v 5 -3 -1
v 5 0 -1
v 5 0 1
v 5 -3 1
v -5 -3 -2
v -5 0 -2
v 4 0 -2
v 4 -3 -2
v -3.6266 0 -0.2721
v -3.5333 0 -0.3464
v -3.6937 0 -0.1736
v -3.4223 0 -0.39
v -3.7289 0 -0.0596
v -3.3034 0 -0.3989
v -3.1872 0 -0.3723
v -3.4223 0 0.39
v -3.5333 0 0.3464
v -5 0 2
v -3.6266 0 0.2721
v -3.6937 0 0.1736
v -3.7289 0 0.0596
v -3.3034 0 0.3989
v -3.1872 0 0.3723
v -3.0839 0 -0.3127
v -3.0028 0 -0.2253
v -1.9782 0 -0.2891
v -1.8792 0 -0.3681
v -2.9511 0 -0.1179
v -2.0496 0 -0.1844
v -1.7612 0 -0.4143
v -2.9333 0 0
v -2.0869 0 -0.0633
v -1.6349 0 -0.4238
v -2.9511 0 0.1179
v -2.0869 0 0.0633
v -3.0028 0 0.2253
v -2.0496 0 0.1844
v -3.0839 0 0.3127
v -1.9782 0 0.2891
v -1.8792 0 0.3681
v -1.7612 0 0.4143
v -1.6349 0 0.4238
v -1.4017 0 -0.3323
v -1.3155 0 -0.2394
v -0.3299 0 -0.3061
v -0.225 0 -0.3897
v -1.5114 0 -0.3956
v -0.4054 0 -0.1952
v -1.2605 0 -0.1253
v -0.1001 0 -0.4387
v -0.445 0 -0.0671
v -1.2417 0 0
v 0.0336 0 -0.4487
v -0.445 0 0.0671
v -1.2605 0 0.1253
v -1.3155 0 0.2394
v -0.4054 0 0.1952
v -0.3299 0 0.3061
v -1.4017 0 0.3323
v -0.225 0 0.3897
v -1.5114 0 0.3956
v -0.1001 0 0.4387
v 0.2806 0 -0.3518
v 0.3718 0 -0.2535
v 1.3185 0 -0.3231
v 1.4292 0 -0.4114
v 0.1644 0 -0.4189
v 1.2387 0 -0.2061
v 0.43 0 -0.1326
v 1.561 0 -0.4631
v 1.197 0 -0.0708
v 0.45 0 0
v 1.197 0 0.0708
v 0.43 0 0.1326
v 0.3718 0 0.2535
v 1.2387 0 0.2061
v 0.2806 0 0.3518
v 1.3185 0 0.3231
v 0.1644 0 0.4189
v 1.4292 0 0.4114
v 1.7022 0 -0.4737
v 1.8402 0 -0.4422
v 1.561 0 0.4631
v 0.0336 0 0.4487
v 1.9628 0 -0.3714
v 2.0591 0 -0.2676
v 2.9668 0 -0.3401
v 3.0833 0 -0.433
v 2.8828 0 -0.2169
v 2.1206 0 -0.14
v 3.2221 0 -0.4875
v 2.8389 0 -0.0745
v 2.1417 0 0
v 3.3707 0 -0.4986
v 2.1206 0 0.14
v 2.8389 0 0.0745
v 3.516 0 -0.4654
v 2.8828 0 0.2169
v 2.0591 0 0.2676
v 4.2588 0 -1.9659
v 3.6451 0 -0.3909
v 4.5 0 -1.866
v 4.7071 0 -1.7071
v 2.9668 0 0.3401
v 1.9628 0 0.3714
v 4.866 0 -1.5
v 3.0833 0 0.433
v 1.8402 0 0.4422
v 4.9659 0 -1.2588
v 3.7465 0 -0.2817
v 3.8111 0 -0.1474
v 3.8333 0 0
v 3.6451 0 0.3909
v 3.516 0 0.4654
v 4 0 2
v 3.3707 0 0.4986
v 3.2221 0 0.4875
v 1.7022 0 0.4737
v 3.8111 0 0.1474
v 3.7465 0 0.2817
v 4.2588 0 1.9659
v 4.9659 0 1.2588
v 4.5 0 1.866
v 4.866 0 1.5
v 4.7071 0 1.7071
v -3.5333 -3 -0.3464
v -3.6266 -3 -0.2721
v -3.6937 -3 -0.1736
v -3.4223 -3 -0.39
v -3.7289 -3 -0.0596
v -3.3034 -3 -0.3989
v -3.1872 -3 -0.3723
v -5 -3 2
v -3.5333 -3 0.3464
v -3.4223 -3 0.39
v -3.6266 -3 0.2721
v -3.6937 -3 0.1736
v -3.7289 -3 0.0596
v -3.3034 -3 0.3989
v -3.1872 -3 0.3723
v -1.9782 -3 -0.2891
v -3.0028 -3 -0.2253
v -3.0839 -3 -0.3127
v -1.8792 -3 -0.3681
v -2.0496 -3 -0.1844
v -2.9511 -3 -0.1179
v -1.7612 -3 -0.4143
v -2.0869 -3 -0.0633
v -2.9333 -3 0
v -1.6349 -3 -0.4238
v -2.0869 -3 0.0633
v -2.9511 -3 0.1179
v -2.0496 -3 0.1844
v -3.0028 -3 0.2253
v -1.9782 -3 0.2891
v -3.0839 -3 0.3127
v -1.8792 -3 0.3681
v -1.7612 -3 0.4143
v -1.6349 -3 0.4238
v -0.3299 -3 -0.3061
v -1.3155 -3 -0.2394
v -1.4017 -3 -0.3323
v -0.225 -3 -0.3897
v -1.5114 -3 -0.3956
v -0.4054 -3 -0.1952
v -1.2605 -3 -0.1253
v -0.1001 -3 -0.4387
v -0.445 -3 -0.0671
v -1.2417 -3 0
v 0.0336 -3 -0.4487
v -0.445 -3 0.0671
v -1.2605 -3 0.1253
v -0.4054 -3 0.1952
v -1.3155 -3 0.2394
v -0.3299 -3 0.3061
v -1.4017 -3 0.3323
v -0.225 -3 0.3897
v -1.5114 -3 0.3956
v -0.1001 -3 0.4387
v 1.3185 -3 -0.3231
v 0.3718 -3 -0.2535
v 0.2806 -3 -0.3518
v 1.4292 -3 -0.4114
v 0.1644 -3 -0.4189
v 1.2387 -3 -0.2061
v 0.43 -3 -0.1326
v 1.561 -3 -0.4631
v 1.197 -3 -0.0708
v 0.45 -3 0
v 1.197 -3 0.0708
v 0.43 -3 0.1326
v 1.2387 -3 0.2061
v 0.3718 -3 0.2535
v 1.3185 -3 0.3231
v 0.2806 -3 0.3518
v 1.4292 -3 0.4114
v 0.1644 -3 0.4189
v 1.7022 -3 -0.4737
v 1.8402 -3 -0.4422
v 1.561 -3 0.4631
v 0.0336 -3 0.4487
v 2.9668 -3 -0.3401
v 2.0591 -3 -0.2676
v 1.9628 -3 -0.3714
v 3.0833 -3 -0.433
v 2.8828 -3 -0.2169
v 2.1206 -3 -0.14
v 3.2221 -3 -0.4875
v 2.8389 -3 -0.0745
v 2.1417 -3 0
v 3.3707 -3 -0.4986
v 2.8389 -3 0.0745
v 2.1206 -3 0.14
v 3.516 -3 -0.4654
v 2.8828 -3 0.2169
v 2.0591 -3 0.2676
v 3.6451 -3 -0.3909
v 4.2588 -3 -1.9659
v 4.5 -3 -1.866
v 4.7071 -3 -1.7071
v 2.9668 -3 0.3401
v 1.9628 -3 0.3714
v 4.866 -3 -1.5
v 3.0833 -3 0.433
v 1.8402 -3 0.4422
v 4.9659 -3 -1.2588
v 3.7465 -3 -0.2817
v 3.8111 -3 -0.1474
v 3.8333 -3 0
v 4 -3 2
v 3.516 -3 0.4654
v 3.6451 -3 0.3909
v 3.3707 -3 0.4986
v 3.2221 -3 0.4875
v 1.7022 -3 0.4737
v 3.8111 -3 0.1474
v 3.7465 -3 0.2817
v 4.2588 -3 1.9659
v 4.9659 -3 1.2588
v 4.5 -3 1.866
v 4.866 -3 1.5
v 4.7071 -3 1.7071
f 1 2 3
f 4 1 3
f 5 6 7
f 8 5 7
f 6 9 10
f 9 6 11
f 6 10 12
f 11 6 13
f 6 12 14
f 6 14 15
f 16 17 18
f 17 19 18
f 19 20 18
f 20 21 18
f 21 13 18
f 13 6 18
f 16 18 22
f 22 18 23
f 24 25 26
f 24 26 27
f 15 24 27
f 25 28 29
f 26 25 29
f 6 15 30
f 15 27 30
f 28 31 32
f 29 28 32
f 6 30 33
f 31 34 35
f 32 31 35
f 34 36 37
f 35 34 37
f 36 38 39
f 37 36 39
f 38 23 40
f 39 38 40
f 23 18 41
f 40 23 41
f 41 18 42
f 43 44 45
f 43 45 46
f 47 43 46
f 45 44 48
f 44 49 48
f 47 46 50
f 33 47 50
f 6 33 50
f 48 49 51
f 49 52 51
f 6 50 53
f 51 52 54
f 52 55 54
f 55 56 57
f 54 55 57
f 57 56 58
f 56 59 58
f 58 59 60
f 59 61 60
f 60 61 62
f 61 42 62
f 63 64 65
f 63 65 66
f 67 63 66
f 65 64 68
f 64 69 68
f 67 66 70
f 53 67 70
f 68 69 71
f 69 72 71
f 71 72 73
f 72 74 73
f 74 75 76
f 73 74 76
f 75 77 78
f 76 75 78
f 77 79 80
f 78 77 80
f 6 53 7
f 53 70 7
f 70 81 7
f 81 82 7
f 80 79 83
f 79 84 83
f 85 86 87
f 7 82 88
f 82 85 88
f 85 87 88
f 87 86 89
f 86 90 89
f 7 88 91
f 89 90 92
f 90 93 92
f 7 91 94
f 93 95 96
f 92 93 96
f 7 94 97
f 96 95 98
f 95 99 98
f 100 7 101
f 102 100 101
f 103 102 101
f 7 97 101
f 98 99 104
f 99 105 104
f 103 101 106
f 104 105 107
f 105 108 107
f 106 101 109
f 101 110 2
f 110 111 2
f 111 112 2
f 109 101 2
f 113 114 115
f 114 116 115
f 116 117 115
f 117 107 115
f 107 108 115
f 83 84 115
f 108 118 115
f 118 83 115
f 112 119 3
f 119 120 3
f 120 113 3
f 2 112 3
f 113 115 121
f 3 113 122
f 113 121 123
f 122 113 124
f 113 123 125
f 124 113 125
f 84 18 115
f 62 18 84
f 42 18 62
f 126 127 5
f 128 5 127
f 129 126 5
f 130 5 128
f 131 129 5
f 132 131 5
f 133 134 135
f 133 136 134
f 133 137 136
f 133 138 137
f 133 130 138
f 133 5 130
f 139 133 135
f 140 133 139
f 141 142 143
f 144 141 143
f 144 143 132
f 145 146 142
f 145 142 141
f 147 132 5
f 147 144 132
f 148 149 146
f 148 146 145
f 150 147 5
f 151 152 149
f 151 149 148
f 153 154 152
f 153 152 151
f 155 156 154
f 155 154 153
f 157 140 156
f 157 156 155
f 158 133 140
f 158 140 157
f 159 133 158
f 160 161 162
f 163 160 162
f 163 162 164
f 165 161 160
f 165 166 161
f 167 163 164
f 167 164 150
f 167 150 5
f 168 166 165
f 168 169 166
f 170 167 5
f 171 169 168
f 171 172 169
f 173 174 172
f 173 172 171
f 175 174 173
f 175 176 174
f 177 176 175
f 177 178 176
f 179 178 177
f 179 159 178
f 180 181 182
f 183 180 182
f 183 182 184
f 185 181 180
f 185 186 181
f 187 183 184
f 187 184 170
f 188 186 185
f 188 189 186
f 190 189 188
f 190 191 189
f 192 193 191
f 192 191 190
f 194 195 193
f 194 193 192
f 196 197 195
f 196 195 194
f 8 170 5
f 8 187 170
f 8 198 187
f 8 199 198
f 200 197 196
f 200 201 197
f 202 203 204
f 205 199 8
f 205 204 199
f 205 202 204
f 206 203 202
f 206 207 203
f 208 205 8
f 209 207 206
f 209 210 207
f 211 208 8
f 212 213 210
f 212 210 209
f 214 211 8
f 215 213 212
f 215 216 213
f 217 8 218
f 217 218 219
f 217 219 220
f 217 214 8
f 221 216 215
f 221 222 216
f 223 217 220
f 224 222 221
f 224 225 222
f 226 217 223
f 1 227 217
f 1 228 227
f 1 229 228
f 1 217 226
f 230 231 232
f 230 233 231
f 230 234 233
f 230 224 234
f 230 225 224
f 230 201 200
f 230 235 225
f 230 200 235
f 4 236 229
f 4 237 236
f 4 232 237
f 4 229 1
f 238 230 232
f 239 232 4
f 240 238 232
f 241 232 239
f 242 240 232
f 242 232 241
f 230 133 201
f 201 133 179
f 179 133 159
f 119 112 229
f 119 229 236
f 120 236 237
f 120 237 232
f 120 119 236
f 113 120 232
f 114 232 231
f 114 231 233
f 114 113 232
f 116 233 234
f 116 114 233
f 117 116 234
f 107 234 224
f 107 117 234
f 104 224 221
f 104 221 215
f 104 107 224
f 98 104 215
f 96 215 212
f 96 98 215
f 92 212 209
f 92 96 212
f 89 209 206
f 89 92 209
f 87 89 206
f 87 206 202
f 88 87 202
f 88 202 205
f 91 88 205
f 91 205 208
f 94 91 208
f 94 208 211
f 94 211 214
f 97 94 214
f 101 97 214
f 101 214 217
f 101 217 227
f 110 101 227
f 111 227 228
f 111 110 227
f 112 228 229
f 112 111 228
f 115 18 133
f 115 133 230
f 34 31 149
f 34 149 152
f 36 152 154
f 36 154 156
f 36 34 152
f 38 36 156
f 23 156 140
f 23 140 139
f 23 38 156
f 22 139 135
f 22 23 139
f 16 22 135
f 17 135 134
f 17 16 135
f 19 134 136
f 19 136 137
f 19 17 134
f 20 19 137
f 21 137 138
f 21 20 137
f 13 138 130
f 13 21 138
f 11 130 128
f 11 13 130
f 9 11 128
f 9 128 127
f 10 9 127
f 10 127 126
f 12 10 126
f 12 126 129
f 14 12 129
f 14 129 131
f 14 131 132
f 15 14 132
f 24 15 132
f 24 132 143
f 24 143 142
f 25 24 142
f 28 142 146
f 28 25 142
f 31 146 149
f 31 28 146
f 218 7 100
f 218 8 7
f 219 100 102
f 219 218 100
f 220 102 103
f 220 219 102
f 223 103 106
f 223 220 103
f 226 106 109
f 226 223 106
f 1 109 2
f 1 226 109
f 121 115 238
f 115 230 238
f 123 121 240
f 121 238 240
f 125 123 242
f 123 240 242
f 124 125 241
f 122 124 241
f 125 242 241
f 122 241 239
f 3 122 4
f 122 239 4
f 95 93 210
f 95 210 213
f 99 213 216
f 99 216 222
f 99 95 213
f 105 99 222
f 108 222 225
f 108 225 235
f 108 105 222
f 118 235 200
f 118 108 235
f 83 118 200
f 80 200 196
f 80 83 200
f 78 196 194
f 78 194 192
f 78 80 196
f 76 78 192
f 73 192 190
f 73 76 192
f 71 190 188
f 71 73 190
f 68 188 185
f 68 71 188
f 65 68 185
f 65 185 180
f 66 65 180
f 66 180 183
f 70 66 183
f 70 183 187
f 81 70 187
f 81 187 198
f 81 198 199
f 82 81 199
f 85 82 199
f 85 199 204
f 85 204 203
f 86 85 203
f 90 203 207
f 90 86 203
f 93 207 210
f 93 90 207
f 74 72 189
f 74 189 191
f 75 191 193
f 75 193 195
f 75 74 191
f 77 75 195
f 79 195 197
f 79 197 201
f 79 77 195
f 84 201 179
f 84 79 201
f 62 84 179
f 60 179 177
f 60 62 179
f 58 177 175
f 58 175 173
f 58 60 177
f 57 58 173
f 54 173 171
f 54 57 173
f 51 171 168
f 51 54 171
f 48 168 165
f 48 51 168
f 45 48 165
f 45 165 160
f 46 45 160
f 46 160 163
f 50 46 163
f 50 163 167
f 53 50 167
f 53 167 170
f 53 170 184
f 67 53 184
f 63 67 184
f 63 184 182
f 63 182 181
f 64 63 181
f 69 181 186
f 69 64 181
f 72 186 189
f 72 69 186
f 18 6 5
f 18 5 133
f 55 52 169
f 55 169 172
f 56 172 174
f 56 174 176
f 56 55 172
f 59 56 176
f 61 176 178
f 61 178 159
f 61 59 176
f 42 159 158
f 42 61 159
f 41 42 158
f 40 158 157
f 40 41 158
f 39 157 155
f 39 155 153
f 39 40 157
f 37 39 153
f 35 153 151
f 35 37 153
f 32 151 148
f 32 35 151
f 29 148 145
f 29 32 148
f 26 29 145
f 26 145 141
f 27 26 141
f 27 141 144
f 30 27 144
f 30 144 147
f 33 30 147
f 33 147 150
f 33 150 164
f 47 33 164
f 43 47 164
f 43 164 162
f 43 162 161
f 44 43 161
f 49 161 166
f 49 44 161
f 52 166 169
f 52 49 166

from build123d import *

# Parameters (mm, degrees)
F0_W     = 10
F0_H     = 4
F0_R     = 0.4
F0_R_2   = 0.425
F0_R_3   = 0.45
F0_R_4   = 0.475
F0_R_5   = 0.5
F1_DEPTH = 3
F2_R     = 1


with BuildPart() as f1:
    # F0 (on Front) → F1 (new body)
    with BuildSketch(Plane.XZ):
        Rectangle(F0_W, F0_H)
        with Locations((-3.333333, 0)):
            Circle(F0_R, mode=Mode.SUBTRACT)
        with Locations((-1.666667, 0)):
            Circle(F0_R_2, mode=Mode.SUBTRACT)
        Circle(F0_R_3, mode=Mode.SUBTRACT)
        with Locations((1.666667, 0)):
            Circle(F0_R_4, mode=Mode.SUBTRACT)
        with Locations((3.333333, 0)):
            Circle(F0_R_5, mode=Mode.SUBTRACT)
    extrude(amount=F1_DEPTH)

    # F2
    f2_edges = [f1.edges().sort_by_distance(p)[0] for p in [
        (5, -1.5, 2),
        (5, -1.5, -2),
    ]]
    fillet(f2_edges, radius=F2_R)


solid = f1.part
